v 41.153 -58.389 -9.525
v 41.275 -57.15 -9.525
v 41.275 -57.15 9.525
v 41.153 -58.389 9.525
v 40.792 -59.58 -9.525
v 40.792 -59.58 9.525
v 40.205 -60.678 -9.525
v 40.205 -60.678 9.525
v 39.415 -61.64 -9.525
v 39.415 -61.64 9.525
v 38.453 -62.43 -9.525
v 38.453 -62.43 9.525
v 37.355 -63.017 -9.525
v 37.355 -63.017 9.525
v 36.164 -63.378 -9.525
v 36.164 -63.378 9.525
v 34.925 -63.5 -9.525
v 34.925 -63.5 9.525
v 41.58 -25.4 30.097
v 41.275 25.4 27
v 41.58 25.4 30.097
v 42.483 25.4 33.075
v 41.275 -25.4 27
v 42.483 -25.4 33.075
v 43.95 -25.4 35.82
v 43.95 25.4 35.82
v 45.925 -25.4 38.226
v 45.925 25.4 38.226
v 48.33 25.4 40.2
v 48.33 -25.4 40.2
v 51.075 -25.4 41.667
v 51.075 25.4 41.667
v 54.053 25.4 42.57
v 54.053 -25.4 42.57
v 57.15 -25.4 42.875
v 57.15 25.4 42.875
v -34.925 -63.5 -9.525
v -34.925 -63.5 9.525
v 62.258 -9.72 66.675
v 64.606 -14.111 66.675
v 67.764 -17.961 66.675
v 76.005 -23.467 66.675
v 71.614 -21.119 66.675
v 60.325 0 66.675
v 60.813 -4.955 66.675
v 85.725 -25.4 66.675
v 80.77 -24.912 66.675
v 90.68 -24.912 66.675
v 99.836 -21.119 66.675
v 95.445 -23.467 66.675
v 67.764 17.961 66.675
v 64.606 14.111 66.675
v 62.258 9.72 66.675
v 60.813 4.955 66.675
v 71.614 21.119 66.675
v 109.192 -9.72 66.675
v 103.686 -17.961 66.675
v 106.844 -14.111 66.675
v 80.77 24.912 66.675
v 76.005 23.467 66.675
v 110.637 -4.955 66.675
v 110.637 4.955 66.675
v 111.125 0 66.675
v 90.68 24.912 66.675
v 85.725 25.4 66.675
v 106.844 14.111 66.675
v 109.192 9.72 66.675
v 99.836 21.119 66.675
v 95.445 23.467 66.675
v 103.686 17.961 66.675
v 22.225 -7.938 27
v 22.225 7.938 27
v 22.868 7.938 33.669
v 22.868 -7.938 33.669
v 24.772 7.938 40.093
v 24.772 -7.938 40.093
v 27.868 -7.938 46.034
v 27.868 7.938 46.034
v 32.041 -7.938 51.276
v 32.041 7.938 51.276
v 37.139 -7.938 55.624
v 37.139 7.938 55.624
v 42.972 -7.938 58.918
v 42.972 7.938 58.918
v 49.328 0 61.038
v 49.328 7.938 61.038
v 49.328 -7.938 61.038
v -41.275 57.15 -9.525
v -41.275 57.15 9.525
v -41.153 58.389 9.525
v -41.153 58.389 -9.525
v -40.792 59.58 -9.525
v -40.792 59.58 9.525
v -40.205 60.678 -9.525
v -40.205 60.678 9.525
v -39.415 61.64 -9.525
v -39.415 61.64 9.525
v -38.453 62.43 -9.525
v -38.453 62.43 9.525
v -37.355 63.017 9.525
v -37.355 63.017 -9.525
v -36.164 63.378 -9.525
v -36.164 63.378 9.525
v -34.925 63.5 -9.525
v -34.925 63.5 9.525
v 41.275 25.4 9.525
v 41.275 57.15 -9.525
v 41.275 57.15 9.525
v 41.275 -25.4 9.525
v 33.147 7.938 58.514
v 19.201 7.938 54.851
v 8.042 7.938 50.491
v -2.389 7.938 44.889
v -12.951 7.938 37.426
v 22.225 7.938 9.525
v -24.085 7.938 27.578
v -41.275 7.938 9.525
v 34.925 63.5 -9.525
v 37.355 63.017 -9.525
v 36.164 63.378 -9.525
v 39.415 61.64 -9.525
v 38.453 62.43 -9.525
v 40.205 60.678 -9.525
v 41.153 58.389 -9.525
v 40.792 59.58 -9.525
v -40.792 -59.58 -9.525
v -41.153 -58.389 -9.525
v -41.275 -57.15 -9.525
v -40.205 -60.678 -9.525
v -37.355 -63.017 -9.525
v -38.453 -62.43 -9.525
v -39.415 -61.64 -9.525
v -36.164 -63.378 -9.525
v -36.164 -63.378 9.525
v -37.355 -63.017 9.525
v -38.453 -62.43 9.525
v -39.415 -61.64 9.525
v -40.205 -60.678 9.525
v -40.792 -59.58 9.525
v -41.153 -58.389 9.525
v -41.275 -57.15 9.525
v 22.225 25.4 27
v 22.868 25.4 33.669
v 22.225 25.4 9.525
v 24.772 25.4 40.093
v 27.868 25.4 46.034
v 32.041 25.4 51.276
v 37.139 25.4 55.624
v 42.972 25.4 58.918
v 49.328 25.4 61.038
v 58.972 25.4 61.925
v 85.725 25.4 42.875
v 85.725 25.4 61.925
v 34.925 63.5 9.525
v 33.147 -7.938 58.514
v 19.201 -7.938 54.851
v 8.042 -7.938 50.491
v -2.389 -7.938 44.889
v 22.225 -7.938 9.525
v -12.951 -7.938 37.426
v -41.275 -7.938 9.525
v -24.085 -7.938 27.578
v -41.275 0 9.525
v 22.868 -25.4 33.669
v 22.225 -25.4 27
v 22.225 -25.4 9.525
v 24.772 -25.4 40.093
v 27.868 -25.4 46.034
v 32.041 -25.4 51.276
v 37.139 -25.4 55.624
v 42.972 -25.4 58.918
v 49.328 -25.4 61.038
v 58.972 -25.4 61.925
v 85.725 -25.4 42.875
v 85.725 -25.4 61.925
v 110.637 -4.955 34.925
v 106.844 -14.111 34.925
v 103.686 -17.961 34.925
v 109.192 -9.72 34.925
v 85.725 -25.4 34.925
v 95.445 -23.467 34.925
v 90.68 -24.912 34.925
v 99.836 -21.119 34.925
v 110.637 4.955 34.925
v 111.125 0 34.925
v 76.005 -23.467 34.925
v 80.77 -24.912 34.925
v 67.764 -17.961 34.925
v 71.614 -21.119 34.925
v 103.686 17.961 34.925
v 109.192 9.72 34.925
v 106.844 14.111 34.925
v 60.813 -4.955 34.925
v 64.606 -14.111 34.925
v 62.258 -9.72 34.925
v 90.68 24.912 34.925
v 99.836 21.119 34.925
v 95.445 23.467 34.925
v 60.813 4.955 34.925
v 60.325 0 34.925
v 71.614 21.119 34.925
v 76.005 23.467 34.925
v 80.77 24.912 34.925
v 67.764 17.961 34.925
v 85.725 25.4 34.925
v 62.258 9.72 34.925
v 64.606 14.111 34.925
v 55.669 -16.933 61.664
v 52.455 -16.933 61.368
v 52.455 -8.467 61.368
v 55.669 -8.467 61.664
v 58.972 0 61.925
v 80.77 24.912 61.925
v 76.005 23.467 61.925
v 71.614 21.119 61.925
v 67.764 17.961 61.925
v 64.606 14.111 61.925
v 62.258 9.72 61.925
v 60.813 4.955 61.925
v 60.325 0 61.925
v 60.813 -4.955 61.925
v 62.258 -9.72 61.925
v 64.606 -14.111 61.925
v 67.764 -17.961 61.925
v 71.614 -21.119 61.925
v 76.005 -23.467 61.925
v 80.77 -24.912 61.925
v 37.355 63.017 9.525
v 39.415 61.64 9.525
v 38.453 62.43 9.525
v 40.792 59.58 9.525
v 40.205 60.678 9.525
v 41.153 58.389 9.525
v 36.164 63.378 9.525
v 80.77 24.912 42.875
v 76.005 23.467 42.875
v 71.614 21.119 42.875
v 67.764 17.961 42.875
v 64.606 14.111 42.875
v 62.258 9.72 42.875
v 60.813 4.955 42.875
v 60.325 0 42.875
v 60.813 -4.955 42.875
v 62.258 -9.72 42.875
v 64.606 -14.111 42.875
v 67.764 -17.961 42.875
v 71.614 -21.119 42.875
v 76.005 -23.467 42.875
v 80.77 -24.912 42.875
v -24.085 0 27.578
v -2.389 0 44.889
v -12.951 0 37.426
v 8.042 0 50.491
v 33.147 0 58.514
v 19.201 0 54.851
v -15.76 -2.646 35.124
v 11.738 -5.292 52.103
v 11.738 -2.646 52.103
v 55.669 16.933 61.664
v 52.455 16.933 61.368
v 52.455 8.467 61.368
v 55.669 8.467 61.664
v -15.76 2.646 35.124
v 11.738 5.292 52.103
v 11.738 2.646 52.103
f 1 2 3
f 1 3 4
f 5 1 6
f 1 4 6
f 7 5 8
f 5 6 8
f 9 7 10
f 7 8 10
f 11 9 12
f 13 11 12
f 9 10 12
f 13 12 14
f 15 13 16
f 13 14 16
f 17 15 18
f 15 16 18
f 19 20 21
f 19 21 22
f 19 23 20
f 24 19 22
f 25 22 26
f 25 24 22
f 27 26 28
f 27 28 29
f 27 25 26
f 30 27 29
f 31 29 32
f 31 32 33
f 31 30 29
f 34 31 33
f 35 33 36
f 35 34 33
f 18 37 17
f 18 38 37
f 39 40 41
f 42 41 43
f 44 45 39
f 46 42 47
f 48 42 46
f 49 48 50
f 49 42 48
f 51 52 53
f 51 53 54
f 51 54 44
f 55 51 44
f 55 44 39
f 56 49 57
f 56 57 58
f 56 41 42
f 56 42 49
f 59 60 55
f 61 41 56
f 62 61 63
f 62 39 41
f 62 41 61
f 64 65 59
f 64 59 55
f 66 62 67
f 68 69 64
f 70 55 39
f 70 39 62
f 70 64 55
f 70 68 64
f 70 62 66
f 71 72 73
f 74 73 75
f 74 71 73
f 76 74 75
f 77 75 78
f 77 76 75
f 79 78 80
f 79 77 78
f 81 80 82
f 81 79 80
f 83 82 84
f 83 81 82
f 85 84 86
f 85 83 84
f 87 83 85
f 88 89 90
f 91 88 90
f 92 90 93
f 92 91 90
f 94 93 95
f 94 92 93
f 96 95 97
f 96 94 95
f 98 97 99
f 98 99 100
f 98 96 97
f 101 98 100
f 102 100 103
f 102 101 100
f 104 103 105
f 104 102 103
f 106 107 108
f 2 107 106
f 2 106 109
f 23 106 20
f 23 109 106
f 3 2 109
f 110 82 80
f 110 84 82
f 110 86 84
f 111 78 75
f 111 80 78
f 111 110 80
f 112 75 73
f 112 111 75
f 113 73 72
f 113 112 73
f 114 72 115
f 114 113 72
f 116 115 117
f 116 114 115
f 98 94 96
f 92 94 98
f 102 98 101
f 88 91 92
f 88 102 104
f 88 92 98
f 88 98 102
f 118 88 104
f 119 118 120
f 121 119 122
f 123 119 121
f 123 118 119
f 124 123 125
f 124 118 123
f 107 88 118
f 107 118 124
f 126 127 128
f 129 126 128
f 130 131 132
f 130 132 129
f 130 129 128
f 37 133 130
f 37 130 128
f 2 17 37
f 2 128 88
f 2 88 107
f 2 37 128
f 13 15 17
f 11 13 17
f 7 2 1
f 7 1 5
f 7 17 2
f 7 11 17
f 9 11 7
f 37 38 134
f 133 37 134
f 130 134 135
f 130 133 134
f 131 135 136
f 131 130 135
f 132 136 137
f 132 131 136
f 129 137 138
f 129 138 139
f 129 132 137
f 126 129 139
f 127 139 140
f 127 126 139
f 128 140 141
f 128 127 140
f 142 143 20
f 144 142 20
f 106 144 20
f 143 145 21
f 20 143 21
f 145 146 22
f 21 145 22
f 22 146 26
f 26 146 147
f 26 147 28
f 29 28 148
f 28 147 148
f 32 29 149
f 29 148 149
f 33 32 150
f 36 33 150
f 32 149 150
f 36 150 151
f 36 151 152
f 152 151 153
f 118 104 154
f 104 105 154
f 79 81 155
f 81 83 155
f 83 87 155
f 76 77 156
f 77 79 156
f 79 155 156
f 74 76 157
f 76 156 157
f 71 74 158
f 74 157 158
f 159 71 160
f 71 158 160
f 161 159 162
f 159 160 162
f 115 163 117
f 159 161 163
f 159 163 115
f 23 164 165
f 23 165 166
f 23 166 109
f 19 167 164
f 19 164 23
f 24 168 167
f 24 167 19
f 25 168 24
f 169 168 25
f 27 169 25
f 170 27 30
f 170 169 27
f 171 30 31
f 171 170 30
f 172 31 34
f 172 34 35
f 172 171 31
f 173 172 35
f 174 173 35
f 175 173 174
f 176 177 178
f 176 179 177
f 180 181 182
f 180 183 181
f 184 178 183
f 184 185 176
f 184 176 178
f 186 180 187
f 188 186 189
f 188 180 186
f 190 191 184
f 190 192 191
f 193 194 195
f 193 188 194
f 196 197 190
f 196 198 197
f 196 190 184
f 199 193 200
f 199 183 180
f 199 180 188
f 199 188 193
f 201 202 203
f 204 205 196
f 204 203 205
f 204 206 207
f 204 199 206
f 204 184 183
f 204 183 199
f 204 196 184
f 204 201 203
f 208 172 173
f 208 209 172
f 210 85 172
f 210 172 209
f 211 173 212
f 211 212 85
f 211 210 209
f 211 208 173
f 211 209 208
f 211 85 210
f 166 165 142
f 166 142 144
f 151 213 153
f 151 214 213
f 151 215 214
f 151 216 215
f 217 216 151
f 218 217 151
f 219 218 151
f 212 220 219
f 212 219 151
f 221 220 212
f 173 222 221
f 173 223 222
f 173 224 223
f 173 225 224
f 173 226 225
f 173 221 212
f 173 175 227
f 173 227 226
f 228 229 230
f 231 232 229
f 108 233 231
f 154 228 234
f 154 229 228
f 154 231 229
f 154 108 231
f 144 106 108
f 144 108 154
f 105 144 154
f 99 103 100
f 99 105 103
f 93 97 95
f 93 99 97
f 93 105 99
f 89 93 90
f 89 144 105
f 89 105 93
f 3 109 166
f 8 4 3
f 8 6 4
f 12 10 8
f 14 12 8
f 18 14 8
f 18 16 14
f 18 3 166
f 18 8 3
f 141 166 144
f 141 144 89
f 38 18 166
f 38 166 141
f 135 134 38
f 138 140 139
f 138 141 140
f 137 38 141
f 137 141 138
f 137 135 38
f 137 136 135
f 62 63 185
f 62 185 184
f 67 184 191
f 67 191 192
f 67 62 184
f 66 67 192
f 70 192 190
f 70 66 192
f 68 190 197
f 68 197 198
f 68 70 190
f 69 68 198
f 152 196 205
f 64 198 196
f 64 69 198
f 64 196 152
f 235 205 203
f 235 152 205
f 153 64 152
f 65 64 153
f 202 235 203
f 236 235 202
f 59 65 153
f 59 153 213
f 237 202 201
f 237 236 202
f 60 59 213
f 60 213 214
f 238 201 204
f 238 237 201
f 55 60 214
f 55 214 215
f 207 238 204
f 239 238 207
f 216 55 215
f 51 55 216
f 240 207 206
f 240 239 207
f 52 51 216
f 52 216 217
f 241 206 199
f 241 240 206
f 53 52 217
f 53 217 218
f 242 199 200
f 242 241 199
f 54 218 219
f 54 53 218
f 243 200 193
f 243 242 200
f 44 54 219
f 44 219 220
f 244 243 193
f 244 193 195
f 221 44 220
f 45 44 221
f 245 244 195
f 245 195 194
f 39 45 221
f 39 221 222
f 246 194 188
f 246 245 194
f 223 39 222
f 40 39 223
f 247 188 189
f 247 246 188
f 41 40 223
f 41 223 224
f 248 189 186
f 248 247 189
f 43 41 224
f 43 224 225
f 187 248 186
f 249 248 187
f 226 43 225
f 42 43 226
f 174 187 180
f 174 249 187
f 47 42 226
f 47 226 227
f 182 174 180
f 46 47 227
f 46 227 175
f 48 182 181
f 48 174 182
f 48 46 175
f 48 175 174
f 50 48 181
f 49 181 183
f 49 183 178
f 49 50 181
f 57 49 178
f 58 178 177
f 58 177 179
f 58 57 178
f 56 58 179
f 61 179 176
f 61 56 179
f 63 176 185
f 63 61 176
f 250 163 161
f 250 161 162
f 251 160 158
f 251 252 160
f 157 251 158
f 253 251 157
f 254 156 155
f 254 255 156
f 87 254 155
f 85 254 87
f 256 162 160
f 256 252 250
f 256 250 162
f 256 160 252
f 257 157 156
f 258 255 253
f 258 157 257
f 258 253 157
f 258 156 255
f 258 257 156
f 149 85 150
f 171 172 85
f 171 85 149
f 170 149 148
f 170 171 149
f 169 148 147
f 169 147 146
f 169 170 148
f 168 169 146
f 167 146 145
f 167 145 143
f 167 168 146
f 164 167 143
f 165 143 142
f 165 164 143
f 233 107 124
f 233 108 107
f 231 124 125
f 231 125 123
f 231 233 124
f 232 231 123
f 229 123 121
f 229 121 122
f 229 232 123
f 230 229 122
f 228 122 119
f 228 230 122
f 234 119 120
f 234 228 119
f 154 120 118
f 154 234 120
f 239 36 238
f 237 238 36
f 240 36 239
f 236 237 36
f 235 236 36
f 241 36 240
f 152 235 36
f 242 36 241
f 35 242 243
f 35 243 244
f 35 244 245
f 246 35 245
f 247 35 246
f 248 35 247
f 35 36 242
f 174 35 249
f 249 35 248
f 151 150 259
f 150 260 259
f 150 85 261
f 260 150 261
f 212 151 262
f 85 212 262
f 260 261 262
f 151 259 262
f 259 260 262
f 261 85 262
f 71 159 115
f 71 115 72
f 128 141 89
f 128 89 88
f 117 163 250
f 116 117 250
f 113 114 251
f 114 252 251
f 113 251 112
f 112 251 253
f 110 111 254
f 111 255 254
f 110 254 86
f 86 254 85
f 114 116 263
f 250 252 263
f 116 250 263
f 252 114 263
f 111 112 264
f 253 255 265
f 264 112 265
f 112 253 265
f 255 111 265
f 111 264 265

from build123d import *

# Parameters (mm, degrees)
F1_DEPTH = 63.5
F0_W     = 25.4
F0_H     = 19.05
F2_DEPTH = 25.4
F3_DEPTH = 7.9375
F5_R     = 6.35


with BuildPart() as f1:
    # F0 (on Front) → F1 (new body, symmetric)
    with BuildSketch(Plane.XZ):
        Polygon((-41.275, -9.525), (41.275, -9.525), (41.275, 9.525), (22.225, 9.525), (-41.275, 9.525), align=None)
    extrude(amount=F1_DEPTH, both=True)

    # F0 (on Front) → F2 (join, symmetric)
    with BuildSketch(Plane.XZ):
        with Locations((73.025, 52.4002)):
            Rectangle(F0_W, F0_H)
        with BuildLine():
            Line((22.225, 9.525), (41.275, 9.525))
            Line((41.275, 9.525), (41.275, 27.0002))
            ThreePointArc((41.275, 27.0002), (45.9246798487, 38.2255201513), (57.15, 42.8752))
            Line((57.15, 42.8752), (60.325, 42.8752))
            Line((60.325, 42.8752), (60.325, 61.9252))
            Line((60.325, 61.9252), (58.9716620743, 61.9252))
            add(Edge.make_bspline(
                [(49.3280599422, 61.0380154224), (52.4124065247, 61.3853046372), (55.623110734, 61.6807605246), (58.9716620743, 61.9252)],
                knots=[105.9109768732, 105.9109768732, 105.9109768732, 105.9109768732, 113.1157558304, 113.1157558304, 113.1157558304, 113.1157558304], degree=3))
            ThreePointArc((49.3280599422, 61.0380154224), (29.8284253609, 48.7553645418), (22.225, 27.0002))
            Line((22.225, 27.0002), (22.225, 9.525))
        make_face()
    extrude(amount=F2_DEPTH, both=True)

    # F0 (on Front) → F4 (revolve)
    with BuildSketch(Plane.XZ):
        Polygon((85.725, 61.9252), (85.725, 42.8752), (85.725, 34.925), (111.125, 34.925), (111.125, 66.675), (85.725, 66.675), align=None)
    revolve(axis=Axis((85.725, 0, 50.8), (0, 0, 1)))

    # F5
    f5_edges = [f1.edges().sort_by_distance(p)[0] for p in [
        (-41.275, -63.5, 0),
        (41.275, -63.5, 0),
        (-41.275, 63.5, 0),
        (41.275, 63.5, 0),
    ]]
    fillet(f5_edges, radius=F5_R)


with BuildPart() as f3:
    # F0 (on Front) → F3 (new body, symmetric)
    with BuildSketch(Plane.XZ):
        with BuildLine():
            add(Edge.make_bspline(
                [(-41.275, 9.525), (-14.0473573265, 39.6268251793), (3.9878542948, 55.9328289605), (49.3280599422, 61.0380154224)],
                knots=[0, 0, 0, 0, 105.9109768732, 105.9109768732, 105.9109768732, 105.9109768732], degree=3))
            Line((-41.275, 9.525), (22.225, 9.525))
            Line((22.225, 9.525), (22.225, 27.0002))
            ThreePointArc((22.225, 27.0002), (29.8284253609, 48.7553645418), (49.3280599422, 61.0380154224))
        make_face()
    extrude(amount=F3_DEPTH, both=True)


solid = Compound([f1.part, f3.part])
